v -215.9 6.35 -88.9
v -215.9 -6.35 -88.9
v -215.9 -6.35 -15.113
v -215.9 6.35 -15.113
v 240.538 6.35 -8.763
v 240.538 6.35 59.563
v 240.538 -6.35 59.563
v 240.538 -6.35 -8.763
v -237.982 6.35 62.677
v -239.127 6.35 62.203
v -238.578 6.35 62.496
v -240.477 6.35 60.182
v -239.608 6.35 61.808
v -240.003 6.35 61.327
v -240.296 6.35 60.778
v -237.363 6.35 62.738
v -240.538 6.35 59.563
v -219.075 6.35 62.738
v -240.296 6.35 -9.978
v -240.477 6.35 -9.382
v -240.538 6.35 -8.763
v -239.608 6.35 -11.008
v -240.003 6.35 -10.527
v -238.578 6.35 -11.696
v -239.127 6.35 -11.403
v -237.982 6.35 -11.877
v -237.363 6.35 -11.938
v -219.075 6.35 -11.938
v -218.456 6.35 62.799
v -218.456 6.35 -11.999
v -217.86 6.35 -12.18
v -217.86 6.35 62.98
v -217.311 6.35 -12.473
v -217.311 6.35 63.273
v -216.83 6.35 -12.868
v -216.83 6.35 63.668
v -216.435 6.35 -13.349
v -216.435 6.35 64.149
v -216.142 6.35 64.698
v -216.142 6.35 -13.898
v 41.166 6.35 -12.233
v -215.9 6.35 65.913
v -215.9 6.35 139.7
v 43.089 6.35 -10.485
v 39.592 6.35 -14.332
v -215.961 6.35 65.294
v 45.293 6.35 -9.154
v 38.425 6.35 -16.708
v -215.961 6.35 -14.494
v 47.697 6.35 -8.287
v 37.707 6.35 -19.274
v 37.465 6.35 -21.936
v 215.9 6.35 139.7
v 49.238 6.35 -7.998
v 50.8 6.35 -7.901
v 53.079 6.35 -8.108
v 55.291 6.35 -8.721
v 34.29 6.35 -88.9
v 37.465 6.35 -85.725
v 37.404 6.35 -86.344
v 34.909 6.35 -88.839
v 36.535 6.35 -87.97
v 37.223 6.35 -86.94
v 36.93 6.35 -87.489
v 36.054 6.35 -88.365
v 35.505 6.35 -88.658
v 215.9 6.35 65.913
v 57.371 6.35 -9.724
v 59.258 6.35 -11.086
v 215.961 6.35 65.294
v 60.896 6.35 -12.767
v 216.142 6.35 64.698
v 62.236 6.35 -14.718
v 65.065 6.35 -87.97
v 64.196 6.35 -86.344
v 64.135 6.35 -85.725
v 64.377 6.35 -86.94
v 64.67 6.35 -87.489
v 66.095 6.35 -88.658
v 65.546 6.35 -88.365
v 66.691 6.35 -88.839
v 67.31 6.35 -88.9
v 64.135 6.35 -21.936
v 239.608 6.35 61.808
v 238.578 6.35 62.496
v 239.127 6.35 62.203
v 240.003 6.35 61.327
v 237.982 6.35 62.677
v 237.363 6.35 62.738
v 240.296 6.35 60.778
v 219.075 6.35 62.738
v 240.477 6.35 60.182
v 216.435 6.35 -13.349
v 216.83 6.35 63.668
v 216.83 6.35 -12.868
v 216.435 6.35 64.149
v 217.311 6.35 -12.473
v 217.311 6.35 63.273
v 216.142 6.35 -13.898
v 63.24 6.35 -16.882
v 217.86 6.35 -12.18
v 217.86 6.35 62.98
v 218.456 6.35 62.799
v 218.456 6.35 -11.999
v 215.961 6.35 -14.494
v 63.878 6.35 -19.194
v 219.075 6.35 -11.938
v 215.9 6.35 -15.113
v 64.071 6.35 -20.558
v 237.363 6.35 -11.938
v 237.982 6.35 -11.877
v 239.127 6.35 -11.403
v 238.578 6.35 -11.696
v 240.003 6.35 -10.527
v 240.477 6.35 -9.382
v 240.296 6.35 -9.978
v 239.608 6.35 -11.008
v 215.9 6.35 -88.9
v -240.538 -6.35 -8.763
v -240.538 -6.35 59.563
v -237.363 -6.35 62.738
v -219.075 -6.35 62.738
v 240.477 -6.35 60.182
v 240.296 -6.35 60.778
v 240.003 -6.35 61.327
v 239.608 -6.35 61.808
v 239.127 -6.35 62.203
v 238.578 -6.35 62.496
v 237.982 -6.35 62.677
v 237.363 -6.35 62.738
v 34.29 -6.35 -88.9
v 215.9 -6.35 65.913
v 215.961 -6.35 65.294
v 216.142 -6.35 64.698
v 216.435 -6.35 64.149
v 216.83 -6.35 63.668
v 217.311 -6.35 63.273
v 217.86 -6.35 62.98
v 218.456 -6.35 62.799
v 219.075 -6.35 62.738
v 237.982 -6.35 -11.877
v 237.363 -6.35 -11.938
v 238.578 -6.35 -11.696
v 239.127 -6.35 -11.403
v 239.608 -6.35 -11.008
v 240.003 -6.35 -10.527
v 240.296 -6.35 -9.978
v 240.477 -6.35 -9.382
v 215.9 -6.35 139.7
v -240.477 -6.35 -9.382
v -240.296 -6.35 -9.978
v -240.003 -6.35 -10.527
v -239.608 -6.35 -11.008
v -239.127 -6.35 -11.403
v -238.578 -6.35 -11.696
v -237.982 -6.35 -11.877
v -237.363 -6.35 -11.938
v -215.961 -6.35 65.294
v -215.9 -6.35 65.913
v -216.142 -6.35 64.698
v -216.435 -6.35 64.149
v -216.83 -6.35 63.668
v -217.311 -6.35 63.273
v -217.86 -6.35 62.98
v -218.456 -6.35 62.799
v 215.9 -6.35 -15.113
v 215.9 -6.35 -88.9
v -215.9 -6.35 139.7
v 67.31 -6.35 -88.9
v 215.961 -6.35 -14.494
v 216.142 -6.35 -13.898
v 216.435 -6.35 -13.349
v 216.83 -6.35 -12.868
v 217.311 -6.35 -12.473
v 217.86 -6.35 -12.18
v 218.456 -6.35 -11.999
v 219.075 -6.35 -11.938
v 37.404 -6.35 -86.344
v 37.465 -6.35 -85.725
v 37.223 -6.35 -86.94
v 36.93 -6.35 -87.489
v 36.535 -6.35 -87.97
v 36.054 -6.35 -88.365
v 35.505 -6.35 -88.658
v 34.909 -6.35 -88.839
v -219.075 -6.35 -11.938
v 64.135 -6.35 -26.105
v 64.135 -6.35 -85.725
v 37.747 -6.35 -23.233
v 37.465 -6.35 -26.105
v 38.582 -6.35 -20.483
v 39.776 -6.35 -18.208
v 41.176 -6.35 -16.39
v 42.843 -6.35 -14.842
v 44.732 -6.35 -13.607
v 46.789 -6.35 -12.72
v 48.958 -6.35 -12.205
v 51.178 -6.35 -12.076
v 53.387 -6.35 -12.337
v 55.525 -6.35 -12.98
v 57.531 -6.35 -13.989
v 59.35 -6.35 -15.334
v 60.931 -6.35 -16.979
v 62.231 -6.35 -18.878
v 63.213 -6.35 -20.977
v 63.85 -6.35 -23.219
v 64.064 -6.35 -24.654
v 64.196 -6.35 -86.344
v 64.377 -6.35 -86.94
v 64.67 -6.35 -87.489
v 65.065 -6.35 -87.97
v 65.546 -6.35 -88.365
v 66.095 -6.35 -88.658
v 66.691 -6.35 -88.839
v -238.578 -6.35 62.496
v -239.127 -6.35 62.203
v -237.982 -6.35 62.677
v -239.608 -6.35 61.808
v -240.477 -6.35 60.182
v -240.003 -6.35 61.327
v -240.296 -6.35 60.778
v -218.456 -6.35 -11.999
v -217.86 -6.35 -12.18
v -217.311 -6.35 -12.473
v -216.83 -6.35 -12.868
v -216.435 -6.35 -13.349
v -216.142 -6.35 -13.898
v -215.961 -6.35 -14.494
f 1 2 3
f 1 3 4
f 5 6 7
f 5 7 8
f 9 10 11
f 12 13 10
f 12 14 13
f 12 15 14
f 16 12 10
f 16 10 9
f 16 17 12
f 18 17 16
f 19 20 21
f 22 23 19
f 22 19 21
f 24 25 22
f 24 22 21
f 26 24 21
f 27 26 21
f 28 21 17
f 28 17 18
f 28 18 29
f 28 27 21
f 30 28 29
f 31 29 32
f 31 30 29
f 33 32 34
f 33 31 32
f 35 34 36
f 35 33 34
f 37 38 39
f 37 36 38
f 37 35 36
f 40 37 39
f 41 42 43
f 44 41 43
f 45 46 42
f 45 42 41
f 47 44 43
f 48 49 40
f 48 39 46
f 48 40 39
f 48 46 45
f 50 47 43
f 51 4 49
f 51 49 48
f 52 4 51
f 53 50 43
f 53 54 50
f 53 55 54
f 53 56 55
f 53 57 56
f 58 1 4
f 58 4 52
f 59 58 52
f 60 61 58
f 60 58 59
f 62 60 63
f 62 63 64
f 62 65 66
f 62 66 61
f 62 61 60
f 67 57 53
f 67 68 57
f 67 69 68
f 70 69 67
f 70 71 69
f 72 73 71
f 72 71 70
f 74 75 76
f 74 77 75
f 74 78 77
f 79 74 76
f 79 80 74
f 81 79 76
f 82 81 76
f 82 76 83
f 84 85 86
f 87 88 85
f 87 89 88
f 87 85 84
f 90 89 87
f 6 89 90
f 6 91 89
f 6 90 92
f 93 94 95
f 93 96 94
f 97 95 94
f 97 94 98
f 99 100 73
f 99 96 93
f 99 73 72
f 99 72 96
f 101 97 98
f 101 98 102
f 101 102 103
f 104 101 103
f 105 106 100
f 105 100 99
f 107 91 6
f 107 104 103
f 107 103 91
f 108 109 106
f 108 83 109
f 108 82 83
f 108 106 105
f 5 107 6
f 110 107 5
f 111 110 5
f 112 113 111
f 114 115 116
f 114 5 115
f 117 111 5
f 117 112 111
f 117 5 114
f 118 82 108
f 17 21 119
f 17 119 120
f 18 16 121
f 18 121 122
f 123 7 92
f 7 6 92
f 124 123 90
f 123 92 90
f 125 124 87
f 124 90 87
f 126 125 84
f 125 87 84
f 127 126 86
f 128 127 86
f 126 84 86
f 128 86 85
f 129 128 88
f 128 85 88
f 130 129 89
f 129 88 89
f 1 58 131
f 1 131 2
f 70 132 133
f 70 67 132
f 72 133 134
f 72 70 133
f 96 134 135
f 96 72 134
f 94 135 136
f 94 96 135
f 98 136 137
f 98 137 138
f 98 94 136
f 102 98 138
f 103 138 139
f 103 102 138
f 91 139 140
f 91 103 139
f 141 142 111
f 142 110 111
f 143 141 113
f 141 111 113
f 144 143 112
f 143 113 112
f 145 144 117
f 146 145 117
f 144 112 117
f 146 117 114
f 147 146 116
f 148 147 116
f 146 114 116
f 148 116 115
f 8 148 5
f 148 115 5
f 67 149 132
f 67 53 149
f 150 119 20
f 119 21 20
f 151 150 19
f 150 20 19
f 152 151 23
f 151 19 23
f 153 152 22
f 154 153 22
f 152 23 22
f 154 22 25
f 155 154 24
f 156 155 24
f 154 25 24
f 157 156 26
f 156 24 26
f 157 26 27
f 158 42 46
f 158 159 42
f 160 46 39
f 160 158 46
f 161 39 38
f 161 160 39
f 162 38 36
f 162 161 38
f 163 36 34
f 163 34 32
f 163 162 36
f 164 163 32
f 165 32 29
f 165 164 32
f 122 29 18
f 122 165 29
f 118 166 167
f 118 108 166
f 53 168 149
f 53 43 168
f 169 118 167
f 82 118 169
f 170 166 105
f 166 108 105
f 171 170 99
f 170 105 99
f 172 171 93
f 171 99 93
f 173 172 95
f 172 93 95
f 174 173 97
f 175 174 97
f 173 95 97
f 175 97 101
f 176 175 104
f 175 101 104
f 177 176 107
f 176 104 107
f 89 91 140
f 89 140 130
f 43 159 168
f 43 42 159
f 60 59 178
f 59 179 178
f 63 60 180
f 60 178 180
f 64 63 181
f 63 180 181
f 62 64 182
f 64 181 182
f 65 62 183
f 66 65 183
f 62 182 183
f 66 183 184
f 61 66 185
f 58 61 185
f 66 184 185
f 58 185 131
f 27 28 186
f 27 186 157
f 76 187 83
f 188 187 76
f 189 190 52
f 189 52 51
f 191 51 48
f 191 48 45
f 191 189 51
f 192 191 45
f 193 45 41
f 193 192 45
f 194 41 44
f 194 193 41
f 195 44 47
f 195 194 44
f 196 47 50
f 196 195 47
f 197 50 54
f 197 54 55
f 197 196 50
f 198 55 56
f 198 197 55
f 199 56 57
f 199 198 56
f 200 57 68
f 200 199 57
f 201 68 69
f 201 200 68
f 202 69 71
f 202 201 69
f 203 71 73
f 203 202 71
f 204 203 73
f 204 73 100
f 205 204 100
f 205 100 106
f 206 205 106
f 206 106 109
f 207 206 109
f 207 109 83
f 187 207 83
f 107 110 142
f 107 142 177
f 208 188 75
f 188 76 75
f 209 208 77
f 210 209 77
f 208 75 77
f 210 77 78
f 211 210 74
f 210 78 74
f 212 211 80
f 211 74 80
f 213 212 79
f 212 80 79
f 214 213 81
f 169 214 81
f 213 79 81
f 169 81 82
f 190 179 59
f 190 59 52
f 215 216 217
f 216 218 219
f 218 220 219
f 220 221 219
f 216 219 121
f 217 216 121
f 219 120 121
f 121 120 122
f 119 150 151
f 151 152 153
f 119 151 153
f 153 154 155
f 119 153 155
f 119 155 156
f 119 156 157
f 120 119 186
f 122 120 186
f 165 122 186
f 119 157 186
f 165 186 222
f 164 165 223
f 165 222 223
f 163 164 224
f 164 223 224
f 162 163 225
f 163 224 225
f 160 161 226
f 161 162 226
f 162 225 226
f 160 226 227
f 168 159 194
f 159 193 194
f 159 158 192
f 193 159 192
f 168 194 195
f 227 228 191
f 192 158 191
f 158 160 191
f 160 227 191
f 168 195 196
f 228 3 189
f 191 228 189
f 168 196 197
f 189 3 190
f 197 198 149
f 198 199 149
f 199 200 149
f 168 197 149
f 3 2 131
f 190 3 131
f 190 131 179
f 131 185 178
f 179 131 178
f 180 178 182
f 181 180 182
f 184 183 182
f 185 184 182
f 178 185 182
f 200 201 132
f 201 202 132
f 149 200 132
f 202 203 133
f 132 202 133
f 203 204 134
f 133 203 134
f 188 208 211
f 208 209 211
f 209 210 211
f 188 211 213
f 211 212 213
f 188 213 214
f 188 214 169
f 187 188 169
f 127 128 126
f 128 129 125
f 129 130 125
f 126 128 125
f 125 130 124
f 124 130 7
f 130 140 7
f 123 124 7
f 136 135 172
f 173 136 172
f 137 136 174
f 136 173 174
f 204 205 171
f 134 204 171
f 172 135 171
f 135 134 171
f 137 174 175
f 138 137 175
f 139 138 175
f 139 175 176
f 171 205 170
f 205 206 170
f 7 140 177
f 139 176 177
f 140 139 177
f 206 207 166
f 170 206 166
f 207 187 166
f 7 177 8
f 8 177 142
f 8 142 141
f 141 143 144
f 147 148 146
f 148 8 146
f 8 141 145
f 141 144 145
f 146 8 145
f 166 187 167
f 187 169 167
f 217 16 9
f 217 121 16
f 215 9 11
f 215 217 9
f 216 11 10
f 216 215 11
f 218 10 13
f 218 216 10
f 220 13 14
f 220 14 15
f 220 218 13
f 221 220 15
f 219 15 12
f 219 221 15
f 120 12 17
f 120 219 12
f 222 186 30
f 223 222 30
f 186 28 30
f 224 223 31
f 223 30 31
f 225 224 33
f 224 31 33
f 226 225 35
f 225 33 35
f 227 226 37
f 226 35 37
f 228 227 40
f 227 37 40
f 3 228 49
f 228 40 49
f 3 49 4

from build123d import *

# Parameters (mm, degrees)
BOSS_EXTRUDE1_DEPTH     = 6.35
CAVITY1_START           = -18.343561252
CAVITY1_OUTLINE_R       = 12.7
CAVITY1_DEPTH           = 21.704189785
CUT_EXTRUDE1_REACH      = 334.451
CUT_EXTRUDE1_END_RADIUS = 12.7
SKETCH4_W               = 25.4
SKETCH4_H               = 12.7
MOVE_FACE_SLOT_BY       = 0.762
MOVE_FACE_SLOT_2_BY     = 0.762
MOVE_FACE_SLOT_3_BY     = 0.762
MOVE_FACE_SLOT_4_BY     = 0.762
MOVE_FACE_SLOT_5_BY     = 0.762
MOVE_FACE_SLOT_6_BY     = 0.762
MOVE_START              = -33.759043645
MOVE_FACE_HOLE_DEPTH    = 37.328109508
FILLET1_R               = 3.175


# Read off the part's stored shape, not the designer's step: Cavity1, Move Face hole
with BuildPart() as part:
    # Sketch1 → Boss-Extrude1 (new, symmetric)
    with BuildSketch(Plane(origin=(0, 0, 0), x_dir=(1, 0, 0), z_dir=(0, 1, 0))):
        Polygon((-215.9, -139.7), (215.9, -139.7), (215.9, -63.5), (241.3, -63.5), (241.3, 12.7), (215.9, 12.7), (215.9, 88.9), (-215.9, 88.9), (-215.9, 12.7), (-241.3, 12.7), (-241.3, -63.5), (-215.9, -63.5), align=None)
    extrude(amount=BOSS_EXTRUDE1_DEPTH, both=True)

    # Cavity1 outline → Cavity1 (cut)
    with BuildSketch(Plane(origin=(0, 0, 0), x_dir=(1, 0, 0), z_dir=(0, 0.9501228611580828, 0.31187585463574896)).offset(CAVITY1_START)):
        with Locations((50.8, 22.822585801)):
            Circle(CAVITY1_OUTLINE_R)
    extrude(amount=CAVITY1_DEPTH, mode=Mode.SUBTRACT)

    # Cut-Extrude1: up to this cylinder (the profile starts outside it)
    cut_extrude1_end = Plane(origin=(50.8, -19.225068271, -30.3312567), z_dir=(0, -0.9501228611580824, -0.3118758546357494)) * Cylinder(CUT_EXTRUDE1_END_RADIUS, 695.302, mode=Mode.PRIVATE)
    # Sketch4 → Cut-Extrude1 (cut, up to the surface)
    with BuildSketch(Plane(origin=(0, 0, -88.9), x_dir=(-1, 0, 0), z_dir=(0, 0, -1)), mode=Mode.PRIVATE) as cut_extrude1_sk1:
        with Locations((-50.8, 0)):
            Rectangle(SKETCH4_W, SKETCH4_H)
    cut_extrude1_tool1 = extrude(cut_extrude1_sk1.sketch, amount=-CUT_EXTRUDE1_REACH, mode=Mode.PRIVATE) - cut_extrude1_end
    add(cut_extrude1_tool1.solids().sort_by_distance((50.8, 0, -88.9))[0], mode=Mode.SUBTRACT)

    # Move Face slot: a face moved inward by 0.762
    extrude(part.faces().sort_by_distance((228.6, 0, 63.5))[0], amount=MOVE_FACE_SLOT_BY, dir=(0, 0, -1), mode=Mode.SUBTRACT)

    # Move Face slot 2: a face moved inward by 0.762
    extrude(part.faces().sort_by_distance((228.6, 0, -12.7))[0], amount=MOVE_FACE_SLOT_2_BY, dir=(0, 0, 1), mode=Mode.SUBTRACT)

    # Move Face slot 3: a face moved inward by 0.762
    extrude(part.faces().sort_by_distance((241.3, 0, 25.4))[0], amount=MOVE_FACE_SLOT_3_BY, dir=(-1, 0, 0), mode=Mode.SUBTRACT)

    # Move Face slot 4: a face moved inward by 0.762
    extrude(part.faces().sort_by_distance((-228.6, 0, 63.5))[0], amount=MOVE_FACE_SLOT_4_BY, dir=(0, 0, -1), mode=Mode.SUBTRACT)

    # Move Face slot 5: a face moved inward by 0.762
    extrude(part.faces().sort_by_distance((-241.3, 0, 25.4))[0], amount=MOVE_FACE_SLOT_5_BY, dir=(1, 0, 0), mode=Mode.SUBTRACT)

    # Move Face slot 6: a face moved inward by 0.762
    extrude(part.faces().sort_by_distance((-228.6, 0, -12.7))[0], amount=MOVE_FACE_SLOT_6_BY, dir=(0, 0, 1), mode=Mode.SUBTRACT)

    # Move Face hole outline → Move Face hole (cut)
    with BuildSketch(Plane(origin=(0, 0, 0), x_dir=(1, 0, 0), z_dir=(0, 0.9501228611580828, 0.31187585463574896)).offset(MOVE_START)):
        with BuildLine():
            ThreePointArc((37.465, 22.822585801), (50.8, 9.487585801), (64.135, 22.822585801))
            Line((64.135, 22.822585801), (64.135, 88))
            Line((64.135, 88), (63.5, 88))
            Line((63.5, 88), (63.5, 22.822585801))
            ThreePointArc((63.5, 22.822585801), (50.8, 10.122585801), (38.1, 22.822585801))
            Line((38.1, 22.822585801), (38.1, 88))
            Line((38.1, 88), (37.465, 88))
            Line((37.465, 88), (37.465, 22.822585801))
        make_face()
    extrude(amount=MOVE_FACE_HOLE_DEPTH, mode=Mode.SUBTRACT)

    # Fillet1
    fillet1_edges = [part.edges().sort_by_distance(p)[0] for p in [
        (-215.9, 0, -11.938),
        (-240.538, 0, -11.938),
        (-240.538, 0, 62.738),
        (-215.9, 0, 62.738),
        (64.135, 0, -88.9),
        (37.465, 0, -88.9),
        (215.9, 0, 62.738),
        (240.538, 0, 62.738),
        (240.538, 0, -11.938),
        (215.9, 0, -11.938),
    ]]
    fillet(fillet1_edges, radius=FILLET1_R)


solid = part.part
